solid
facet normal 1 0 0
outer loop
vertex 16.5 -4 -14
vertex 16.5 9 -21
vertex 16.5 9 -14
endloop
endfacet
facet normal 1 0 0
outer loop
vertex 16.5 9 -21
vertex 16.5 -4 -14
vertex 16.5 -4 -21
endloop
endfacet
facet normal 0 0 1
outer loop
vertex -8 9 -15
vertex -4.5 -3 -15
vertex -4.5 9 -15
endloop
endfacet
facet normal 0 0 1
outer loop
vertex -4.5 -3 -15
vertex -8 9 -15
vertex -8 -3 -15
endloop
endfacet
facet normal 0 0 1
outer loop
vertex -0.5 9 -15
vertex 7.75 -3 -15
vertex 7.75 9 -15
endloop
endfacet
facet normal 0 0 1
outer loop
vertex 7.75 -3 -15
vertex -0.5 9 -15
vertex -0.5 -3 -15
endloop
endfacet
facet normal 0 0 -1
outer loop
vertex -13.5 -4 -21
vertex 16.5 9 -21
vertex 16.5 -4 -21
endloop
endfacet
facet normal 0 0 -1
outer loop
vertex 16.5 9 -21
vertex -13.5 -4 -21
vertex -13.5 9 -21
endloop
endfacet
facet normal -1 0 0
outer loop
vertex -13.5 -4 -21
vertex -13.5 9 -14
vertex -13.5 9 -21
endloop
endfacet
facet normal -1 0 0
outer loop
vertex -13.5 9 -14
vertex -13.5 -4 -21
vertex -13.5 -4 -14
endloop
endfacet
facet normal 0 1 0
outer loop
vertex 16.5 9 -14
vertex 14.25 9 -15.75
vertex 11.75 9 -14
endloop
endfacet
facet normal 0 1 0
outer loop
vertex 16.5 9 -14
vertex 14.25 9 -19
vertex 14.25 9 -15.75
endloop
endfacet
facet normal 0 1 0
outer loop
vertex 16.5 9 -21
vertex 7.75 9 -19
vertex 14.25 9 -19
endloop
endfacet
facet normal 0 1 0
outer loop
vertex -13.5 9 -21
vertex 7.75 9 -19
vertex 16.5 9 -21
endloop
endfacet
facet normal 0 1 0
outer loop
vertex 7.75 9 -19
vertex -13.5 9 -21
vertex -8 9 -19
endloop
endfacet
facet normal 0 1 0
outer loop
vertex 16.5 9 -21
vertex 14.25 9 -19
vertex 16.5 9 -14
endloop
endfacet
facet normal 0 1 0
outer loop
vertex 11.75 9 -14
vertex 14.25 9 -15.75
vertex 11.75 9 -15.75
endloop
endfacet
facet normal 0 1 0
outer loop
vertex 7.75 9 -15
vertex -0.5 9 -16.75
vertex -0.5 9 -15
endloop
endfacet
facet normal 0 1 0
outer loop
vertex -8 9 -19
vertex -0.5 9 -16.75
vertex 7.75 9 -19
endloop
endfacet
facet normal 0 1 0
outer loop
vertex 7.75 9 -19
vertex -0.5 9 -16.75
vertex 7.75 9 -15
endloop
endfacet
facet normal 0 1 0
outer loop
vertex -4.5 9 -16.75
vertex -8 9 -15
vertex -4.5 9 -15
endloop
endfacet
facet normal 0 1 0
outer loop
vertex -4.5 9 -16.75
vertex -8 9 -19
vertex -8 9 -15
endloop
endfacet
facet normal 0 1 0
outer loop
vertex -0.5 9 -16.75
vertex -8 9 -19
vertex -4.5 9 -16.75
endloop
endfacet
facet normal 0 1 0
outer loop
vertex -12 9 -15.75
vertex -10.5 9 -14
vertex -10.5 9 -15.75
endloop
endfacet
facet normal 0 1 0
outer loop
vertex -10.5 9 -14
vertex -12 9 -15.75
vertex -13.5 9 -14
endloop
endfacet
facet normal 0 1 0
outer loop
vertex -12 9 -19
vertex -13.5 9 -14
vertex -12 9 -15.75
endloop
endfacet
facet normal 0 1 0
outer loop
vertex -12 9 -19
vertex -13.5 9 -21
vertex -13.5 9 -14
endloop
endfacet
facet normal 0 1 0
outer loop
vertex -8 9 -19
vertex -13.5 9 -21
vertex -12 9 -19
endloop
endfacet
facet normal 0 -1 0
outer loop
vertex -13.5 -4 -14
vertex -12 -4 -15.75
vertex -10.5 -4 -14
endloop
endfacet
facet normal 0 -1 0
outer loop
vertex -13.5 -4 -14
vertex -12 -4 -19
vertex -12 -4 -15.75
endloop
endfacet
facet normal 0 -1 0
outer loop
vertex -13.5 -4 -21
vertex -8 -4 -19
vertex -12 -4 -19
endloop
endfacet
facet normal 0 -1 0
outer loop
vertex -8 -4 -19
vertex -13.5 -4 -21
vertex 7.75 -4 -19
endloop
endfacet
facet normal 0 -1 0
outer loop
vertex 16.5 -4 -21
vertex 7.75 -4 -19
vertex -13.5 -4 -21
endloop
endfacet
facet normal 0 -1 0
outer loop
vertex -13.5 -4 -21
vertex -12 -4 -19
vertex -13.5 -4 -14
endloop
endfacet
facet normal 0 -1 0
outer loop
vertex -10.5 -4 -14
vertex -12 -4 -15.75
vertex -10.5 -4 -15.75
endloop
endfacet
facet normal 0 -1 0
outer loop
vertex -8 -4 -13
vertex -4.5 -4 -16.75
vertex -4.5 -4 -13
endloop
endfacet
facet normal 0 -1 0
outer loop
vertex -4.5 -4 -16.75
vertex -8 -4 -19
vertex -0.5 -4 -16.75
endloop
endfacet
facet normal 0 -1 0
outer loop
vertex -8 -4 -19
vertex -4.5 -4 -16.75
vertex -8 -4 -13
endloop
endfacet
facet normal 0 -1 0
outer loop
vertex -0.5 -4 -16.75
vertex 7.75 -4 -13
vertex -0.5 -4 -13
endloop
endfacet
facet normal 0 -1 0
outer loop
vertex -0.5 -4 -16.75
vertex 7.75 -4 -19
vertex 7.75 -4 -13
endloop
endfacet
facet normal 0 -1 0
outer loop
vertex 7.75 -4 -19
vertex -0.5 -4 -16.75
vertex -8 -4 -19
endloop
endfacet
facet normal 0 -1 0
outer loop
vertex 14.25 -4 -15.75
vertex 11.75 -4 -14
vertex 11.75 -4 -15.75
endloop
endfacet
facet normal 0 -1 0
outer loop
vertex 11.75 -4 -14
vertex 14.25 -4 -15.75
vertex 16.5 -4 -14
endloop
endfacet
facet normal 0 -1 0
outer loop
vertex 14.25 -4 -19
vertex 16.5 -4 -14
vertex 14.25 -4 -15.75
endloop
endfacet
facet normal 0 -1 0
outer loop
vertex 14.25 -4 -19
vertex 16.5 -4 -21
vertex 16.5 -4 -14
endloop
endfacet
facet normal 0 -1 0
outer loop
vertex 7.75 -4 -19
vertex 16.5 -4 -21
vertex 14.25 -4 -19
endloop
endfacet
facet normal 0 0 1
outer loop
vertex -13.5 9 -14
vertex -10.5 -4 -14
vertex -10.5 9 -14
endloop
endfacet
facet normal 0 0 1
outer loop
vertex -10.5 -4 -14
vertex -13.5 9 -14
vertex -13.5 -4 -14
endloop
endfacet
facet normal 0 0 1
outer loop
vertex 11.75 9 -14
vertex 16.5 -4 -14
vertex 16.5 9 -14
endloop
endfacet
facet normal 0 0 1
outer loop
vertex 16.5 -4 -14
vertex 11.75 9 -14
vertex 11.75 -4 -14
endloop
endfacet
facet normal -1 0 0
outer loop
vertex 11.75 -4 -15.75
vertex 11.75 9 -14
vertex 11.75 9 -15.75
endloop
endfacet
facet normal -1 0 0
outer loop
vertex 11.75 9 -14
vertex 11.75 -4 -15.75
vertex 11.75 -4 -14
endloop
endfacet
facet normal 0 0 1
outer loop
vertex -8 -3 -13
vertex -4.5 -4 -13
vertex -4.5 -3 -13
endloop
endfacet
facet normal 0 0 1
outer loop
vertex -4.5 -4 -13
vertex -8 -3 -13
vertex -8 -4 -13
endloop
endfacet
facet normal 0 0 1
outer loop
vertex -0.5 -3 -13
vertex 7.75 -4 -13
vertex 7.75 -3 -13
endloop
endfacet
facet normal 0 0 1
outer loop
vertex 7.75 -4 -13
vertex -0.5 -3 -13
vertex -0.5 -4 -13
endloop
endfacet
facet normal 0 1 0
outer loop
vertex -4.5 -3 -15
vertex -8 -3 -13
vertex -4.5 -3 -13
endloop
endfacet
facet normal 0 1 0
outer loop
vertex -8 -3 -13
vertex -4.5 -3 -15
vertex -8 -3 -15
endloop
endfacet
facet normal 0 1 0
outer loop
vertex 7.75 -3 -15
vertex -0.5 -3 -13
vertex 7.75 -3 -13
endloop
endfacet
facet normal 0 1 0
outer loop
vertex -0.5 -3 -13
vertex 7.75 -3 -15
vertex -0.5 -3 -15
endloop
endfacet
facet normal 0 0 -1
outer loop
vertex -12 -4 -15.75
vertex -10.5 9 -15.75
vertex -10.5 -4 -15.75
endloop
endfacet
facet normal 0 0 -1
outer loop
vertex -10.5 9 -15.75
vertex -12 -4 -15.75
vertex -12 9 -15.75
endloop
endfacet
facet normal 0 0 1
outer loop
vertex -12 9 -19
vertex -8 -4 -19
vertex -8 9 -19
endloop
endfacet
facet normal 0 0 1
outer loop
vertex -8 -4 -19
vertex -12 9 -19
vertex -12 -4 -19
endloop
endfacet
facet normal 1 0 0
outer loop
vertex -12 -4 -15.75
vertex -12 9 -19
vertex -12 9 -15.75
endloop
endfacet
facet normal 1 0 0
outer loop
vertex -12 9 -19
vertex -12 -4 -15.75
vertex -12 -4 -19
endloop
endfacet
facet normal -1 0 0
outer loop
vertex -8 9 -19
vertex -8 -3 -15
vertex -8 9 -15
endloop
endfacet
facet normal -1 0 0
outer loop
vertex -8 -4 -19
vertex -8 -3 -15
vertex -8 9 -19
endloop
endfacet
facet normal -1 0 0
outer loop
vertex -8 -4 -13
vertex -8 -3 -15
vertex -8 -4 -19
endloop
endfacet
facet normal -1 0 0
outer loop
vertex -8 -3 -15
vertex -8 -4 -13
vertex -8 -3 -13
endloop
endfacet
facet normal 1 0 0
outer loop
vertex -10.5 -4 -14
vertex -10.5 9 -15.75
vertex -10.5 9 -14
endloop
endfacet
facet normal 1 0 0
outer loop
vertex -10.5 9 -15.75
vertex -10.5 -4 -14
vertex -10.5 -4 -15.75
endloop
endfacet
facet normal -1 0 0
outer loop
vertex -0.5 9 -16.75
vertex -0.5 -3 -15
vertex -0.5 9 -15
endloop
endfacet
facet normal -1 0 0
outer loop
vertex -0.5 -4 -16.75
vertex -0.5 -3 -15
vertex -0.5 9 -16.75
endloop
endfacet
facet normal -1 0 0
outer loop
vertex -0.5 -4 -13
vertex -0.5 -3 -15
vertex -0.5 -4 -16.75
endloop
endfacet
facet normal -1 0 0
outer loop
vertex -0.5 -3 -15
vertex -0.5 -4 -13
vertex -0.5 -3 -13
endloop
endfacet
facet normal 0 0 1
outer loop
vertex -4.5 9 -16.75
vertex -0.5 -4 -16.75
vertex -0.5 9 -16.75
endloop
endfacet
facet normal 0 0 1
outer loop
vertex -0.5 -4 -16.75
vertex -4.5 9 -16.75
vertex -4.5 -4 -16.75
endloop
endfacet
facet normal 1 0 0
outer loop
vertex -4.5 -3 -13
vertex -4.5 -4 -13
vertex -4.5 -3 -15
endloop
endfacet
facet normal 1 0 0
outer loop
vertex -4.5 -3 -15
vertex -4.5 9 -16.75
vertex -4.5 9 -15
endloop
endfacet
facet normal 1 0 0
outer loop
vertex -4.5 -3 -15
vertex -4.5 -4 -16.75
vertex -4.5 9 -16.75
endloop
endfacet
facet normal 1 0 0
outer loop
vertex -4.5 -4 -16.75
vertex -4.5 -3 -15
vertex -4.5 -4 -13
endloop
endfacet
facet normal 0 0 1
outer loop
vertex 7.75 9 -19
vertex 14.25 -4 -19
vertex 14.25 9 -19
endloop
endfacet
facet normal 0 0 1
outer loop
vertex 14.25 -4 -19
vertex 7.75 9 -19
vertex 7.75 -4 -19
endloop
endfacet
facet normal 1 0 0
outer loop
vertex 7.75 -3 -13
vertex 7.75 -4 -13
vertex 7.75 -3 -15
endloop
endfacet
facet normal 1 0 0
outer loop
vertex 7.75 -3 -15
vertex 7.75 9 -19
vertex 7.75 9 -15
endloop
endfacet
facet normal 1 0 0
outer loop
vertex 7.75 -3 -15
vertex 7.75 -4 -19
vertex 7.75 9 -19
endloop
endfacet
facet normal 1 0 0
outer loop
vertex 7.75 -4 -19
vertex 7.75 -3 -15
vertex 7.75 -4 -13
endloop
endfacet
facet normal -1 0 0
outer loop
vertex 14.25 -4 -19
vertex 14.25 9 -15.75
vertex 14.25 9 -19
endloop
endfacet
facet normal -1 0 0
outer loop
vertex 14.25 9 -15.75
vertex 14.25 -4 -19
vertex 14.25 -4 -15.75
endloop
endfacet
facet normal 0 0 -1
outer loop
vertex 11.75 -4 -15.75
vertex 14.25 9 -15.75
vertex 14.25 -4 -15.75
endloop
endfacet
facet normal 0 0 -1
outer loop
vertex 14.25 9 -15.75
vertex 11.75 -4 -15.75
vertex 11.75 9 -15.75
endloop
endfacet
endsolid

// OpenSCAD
module lichtschranke_mount(h=0) {
	translate([-(2 + 1 + 2.5 + 4 + 4), -2 - 3, -14 - 5]) difference() {
		union() {
			translate([0, 1, -2 - h]) cube([30, 13, 6 + h]);
			
			translate([0, 1, -1]) cube([5, 13, 6]);
			translate([2 + 1 + 2.5 + 3.75 + 3.5 + 12.5, 1, -1]) cube([4.75, 13, 6]);
			
			translate([5, 1, -1]) cube([20, 1, 7]);
		}

		translate([2 - 0.5, 0, 0]) cube([3.5, 15, 3.25]);
		translate([2 + 1, 0, 0]) cube([2.5, 15, 7]);

		translate([2 + 1 + 2.5 + 3.5, 0, 2.25]) cube([4, 15, 4]);

		translate([2 + 1 + 2.5 + 3.75 + 3.5 + 12.5 - 4, 0, 0]) cube([4, 15, 7]);
		translate([2 + 1 + 2.5 + 3.75 + 3.5 + 12.5, 0, 0]) cube([2.5, 15, 3.25]);
	}
	% translate([2.5, -3, 0]) cube([5, 7, 4.2]);
	% translate([-2.5 - 5, -3, 0]) cube([5, 7, 4.2]);
	% translate([2.5, -3, -14]) cube([5, 7, 13.8]);
	% translate([-2.5 - 5, -3, -14]) cube([5, 7, 13.8]);
}

lichtschranke_mount();
